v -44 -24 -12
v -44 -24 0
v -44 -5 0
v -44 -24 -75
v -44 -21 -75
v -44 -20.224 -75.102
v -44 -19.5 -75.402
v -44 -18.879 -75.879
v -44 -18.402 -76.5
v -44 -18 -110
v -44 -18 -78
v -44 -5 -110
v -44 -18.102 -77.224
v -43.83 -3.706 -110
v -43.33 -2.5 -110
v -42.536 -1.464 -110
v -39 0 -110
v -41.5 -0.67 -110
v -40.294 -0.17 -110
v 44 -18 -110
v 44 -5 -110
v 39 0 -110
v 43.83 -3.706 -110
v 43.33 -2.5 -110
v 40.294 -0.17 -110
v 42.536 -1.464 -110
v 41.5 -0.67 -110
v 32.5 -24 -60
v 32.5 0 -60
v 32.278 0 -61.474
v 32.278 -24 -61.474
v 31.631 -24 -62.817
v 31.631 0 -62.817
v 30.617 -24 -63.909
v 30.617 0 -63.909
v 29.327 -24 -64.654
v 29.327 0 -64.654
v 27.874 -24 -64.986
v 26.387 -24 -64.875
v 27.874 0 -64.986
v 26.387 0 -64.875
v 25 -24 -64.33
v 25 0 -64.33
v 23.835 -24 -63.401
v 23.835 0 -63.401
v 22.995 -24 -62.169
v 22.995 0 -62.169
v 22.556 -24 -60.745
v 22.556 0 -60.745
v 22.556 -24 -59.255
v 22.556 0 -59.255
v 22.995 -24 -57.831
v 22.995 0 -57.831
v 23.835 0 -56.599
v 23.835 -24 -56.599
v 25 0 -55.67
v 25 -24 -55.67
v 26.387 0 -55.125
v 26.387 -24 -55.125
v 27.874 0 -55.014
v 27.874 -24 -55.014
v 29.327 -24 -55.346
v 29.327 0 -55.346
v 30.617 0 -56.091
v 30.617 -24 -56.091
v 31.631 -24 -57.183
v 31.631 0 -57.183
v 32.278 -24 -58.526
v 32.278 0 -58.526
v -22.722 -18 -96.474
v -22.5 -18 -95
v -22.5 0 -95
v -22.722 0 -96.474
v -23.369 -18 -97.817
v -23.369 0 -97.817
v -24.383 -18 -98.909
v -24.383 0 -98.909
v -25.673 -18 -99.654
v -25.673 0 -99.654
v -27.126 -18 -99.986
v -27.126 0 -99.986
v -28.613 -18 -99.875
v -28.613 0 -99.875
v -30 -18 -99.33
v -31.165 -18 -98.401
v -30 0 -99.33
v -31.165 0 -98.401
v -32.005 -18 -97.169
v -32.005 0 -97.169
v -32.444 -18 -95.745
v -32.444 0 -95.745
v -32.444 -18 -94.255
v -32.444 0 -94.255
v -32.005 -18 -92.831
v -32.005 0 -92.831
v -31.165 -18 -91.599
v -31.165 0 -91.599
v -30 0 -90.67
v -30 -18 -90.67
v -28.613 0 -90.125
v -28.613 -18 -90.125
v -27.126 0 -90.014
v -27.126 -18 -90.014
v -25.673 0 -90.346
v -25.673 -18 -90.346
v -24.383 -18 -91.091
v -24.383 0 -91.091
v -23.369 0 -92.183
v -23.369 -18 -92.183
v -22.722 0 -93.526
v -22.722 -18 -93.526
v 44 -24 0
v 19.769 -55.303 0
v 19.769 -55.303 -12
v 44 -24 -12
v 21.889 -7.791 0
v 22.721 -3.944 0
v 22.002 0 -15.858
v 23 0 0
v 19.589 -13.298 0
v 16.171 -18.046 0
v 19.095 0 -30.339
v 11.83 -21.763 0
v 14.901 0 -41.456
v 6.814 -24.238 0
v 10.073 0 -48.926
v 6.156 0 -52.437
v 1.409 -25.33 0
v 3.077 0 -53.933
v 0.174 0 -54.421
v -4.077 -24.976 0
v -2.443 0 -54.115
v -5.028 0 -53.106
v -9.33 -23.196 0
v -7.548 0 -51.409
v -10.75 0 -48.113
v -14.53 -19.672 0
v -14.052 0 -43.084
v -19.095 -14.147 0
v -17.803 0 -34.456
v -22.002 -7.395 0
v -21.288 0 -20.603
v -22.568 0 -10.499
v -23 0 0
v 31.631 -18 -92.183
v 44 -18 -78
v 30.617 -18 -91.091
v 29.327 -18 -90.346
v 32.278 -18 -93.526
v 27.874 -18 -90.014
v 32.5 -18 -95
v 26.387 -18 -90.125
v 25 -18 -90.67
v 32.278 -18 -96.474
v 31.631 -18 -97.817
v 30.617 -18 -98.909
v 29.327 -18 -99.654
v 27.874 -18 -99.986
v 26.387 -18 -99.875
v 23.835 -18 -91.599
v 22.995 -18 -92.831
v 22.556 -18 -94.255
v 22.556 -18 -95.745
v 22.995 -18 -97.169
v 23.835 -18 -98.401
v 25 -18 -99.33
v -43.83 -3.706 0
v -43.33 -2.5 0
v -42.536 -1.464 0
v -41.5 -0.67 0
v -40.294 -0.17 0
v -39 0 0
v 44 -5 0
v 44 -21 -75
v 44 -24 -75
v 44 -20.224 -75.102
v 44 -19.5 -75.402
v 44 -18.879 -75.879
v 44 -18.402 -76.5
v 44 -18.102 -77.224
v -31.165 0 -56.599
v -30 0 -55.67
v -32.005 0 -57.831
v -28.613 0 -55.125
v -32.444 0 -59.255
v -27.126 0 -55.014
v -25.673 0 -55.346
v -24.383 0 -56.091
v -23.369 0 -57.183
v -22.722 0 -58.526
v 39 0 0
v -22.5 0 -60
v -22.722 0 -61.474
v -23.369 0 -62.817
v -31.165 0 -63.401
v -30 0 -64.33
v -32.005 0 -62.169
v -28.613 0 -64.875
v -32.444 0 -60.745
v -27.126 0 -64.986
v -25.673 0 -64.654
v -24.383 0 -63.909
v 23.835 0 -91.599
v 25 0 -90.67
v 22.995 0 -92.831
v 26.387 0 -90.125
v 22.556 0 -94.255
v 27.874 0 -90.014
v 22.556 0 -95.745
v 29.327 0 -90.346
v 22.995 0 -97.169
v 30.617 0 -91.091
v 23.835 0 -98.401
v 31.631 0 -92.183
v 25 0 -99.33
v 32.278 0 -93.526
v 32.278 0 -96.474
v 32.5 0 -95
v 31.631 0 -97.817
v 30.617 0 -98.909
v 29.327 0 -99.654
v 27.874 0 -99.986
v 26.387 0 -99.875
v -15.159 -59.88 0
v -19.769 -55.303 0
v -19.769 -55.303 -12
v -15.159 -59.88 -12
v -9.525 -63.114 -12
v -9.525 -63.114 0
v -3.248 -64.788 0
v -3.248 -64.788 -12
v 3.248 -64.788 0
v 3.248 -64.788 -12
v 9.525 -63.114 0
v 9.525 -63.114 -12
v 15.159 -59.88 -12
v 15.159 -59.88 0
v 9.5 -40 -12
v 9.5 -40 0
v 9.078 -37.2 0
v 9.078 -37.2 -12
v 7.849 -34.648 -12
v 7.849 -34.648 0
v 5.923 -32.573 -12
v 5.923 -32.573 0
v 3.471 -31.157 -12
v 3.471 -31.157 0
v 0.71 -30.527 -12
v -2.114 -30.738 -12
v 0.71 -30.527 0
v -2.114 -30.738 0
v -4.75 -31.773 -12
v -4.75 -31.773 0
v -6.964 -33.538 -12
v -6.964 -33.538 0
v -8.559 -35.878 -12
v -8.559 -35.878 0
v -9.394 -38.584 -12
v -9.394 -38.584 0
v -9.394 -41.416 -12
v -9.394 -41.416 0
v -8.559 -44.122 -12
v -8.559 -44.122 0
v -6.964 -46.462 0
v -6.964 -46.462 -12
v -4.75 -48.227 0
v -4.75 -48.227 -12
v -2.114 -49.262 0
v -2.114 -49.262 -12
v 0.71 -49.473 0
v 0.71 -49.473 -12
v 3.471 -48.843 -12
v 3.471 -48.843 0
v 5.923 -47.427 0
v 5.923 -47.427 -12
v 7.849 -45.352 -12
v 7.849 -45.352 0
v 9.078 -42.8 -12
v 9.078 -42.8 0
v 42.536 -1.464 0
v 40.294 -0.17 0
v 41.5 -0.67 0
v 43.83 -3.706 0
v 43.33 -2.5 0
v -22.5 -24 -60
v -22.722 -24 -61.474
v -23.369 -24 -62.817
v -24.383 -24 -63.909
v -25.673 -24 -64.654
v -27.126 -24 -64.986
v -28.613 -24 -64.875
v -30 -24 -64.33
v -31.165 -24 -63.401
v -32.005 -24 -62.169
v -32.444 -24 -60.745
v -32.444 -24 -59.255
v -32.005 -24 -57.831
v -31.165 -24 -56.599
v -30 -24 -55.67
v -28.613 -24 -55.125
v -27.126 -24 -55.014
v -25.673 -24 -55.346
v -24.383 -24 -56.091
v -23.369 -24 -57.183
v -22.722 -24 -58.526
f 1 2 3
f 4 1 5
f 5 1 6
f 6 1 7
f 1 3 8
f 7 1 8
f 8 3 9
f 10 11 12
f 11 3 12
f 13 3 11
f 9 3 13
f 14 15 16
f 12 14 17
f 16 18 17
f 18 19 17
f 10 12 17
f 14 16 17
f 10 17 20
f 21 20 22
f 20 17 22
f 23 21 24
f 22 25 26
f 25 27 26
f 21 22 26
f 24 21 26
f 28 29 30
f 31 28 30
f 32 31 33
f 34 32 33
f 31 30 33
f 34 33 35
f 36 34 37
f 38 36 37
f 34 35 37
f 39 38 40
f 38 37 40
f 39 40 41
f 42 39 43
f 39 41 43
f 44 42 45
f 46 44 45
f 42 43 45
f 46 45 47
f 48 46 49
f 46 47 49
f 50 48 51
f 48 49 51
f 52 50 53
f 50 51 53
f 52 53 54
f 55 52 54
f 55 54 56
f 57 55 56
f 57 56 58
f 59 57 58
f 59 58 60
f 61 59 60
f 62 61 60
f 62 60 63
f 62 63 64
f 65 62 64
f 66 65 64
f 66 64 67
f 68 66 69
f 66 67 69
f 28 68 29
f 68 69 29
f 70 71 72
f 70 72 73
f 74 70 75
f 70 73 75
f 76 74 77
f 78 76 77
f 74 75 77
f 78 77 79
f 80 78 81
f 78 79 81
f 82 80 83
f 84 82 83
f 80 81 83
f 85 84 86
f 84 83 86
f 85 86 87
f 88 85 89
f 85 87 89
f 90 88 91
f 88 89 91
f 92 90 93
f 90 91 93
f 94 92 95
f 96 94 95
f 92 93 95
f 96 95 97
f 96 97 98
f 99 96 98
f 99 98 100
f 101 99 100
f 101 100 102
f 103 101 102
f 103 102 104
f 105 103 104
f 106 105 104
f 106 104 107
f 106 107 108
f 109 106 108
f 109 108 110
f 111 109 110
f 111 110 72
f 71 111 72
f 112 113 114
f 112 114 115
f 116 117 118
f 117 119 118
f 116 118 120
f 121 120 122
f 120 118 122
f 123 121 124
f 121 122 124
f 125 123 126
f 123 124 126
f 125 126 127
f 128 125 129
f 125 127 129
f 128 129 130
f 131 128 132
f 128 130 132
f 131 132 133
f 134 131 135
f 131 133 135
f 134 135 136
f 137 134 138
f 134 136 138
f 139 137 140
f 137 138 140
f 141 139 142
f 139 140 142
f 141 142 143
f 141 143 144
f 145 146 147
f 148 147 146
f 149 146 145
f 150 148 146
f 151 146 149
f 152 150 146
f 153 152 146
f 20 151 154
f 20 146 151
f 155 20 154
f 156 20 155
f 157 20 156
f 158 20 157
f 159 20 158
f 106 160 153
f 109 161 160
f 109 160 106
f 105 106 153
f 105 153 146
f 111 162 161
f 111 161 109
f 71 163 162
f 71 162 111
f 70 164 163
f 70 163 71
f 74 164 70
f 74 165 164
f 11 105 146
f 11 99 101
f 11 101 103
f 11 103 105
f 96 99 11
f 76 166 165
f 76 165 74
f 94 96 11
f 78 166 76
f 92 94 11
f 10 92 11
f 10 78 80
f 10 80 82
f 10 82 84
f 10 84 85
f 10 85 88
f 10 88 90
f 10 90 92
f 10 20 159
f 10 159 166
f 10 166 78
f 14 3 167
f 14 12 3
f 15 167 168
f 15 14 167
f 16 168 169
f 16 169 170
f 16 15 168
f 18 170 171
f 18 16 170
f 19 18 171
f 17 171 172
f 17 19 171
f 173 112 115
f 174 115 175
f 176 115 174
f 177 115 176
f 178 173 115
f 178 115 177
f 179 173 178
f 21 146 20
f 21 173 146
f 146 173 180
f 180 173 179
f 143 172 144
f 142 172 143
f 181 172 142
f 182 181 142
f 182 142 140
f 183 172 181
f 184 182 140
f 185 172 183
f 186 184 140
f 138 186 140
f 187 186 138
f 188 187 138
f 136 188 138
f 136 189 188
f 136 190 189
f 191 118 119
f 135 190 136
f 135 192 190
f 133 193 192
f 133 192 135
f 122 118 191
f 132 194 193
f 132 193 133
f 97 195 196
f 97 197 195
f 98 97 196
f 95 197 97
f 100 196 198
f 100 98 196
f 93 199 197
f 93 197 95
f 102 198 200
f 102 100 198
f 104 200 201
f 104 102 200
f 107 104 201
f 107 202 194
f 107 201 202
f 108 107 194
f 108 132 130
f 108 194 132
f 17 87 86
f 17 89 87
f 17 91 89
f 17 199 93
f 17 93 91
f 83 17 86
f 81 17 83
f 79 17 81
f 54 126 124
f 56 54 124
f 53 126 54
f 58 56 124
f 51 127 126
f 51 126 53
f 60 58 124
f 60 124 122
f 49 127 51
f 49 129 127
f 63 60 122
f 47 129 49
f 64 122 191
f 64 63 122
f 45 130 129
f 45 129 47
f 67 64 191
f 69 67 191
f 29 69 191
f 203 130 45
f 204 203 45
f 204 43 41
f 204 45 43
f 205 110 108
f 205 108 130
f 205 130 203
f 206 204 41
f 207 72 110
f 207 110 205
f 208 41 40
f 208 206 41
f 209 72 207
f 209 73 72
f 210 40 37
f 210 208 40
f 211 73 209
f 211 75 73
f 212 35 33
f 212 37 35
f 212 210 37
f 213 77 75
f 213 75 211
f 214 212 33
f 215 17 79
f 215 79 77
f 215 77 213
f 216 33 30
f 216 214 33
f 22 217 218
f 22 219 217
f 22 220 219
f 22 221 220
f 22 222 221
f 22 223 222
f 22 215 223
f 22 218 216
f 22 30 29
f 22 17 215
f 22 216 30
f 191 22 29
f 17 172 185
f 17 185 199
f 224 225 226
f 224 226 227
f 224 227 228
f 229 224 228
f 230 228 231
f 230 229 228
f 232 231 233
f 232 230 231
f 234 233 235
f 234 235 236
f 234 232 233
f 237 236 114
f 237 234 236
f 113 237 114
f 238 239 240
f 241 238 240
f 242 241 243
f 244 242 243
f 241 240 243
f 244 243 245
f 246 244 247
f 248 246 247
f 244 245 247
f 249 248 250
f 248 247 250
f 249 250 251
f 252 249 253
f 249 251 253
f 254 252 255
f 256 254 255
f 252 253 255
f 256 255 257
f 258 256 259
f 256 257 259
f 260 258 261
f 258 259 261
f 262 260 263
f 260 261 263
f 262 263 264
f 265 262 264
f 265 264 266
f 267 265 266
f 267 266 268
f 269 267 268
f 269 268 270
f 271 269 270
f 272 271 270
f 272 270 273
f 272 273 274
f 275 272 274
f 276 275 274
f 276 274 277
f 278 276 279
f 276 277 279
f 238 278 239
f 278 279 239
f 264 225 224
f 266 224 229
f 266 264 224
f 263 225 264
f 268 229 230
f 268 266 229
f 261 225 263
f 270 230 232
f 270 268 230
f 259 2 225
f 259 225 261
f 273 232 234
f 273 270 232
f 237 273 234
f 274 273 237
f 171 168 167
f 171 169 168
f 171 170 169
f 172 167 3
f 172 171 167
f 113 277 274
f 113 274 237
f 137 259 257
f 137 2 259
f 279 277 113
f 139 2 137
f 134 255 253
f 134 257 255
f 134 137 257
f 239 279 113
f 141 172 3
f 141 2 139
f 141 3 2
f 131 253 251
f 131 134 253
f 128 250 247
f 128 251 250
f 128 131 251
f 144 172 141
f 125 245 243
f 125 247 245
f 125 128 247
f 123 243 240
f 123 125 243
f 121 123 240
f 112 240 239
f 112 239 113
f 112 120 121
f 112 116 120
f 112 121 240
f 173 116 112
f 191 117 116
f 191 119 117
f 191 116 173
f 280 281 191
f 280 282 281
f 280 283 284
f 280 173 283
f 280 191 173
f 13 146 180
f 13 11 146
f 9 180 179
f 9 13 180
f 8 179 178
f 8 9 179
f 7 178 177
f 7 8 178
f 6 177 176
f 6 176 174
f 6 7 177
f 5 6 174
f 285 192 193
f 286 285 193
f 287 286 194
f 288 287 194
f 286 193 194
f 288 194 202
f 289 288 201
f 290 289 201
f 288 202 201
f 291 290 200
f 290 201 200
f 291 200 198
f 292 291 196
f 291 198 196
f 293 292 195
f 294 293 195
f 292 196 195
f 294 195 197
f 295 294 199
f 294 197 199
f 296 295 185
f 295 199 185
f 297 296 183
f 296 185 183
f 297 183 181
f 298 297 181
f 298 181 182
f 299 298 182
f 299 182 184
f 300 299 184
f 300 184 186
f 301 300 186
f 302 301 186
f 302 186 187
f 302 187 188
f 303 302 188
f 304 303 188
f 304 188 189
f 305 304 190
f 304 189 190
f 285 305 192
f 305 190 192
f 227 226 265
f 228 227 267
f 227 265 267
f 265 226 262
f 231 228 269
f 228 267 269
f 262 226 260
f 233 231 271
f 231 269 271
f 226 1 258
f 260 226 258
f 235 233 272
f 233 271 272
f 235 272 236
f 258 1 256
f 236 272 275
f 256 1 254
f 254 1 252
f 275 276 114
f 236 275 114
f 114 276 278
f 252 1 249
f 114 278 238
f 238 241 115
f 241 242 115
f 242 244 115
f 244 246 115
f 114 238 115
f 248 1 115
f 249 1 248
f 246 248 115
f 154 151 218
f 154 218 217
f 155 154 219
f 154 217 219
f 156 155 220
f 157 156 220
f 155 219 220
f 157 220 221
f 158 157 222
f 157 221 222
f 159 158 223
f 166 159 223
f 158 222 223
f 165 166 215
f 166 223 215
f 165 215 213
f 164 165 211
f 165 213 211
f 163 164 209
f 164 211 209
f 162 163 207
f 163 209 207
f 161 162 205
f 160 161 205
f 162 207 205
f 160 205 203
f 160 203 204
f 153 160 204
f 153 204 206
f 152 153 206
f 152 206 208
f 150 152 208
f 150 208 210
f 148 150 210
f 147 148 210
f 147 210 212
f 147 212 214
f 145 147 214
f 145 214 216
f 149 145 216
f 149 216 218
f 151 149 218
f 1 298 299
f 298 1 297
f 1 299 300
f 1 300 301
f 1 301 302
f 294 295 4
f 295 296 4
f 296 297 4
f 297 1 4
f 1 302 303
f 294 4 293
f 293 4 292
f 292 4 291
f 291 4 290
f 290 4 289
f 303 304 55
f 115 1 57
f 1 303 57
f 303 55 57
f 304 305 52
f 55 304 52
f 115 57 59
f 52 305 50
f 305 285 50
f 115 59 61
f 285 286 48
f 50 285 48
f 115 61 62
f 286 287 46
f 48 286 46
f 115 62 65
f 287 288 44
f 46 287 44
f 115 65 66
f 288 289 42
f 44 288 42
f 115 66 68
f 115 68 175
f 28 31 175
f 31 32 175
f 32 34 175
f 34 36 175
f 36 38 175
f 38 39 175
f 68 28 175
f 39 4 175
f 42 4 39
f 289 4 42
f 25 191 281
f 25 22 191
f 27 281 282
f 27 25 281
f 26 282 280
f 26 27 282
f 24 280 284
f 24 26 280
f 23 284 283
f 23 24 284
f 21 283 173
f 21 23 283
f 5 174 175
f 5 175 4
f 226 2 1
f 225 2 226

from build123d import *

# Parameters (mm, degrees)
SKETCH1_W               = 88
SKETCH1_H               = 110
SKETCH1_R               = 5
BOSS_EXTRUDE1_DEPTH     = 24
SKETCH3_R               = 9.5
BOSS_EXTRUDE2_DEPTH     = 12
FILLET1_R               = 5
SKETCH4_W               = 88
SKETCH4_H               = 6
CUT_EXTRUDE1_DEPTH      = 35
FILLET2_R               = 3
SKETCH5_R               = 23
CUT_EXTRUDE2_DEPTH      = 109
CUT_EXTRUDE2_DEPTH_BACK = 35


with BuildPart() as part:
    # Sketch1 → Boss-Extrude1 (new body)
    with BuildSketch(Plane(origin=(0, 0, 0), x_dir=(1, 0, 0), z_dir=(0, 1, 0))):
        with Locations((0, 55)):
            Rectangle(SKETCH1_W, SKETCH1_H)
        with Locations((-27.5, 95)):
            Circle(SKETCH1_R, mode=Mode.SUBTRACT)
        with Locations((-27.5, 60)):
            Circle(SKETCH1_R, mode=Mode.SUBTRACT)
        with Locations((27.5, 60)):
            Circle(SKETCH1_R, mode=Mode.SUBTRACT)
        with Locations((27.5, 95)):
            Circle(SKETCH1_R, mode=Mode.SUBTRACT)
    extrude(amount=-BOSS_EXTRUDE1_DEPTH)

    # Sketch3 → Boss-Extrude2 (add)
    with BuildSketch(Plane.XY):
        with BuildLine():
            Line((-44, -24), (-19.769224603, -55.302867659))
            ThreePointArc((-19.769224603, -55.302867659), (0, -65), (19.769224603, -55.302867659))
            Line((19.769224603, -55.302867659), (44, -24))
            Line((44, -24), (-44, -24))
        make_face()
        with Locations((0, -40)):
            Circle(SKETCH3_R, mode=Mode.SUBTRACT)
    extrude(amount=-BOSS_EXTRUDE2_DEPTH)

    # Fillet1
    fillet1_edges = [part.edges().sort_by_distance(p)[0] for p in [
        (-44, 0, -55),
        (44, 0, -55),
    ]]
    fillet(fillet1_edges, radius=FILLET1_R)

    # Sketch4 → Cut-Extrude1 (cut)
    with BuildSketch(Plane(origin=(0, 0, -110), x_dir=(-1, 0, 0), z_dir=(0, 0, -1))):
        with Locations((0, -21)):
            Rectangle(SKETCH4_W, SKETCH4_H)
    extrude(amount=-CUT_EXTRUDE1_DEPTH, mode=Mode.SUBTRACT)

    # Fillet2
    fillet2_edges = [part.edges().sort_by_distance(p)[0] for p in [
        (0, -18, -75),
    ]]
    fillet(fillet2_edges, radius=FILLET2_R)

    # Sketch5 → Cut-Extrude2 (cut, two sides)
    with BuildSketch(Plane(origin=(0, 0, 0), x_dir=(1, 0, 0), z_dir=(0, 0.422618262, -0.906307787))) as cut_extrude2_sk:
        Circle(SKETCH5_R)
    extrude(amount=CUT_EXTRUDE2_DEPTH, mode=Mode.SUBTRACT)
    extrude(cut_extrude2_sk.sketch, amount=-CUT_EXTRUDE2_DEPTH_BACK, mode=Mode.SUBTRACT)


solid = part.part
